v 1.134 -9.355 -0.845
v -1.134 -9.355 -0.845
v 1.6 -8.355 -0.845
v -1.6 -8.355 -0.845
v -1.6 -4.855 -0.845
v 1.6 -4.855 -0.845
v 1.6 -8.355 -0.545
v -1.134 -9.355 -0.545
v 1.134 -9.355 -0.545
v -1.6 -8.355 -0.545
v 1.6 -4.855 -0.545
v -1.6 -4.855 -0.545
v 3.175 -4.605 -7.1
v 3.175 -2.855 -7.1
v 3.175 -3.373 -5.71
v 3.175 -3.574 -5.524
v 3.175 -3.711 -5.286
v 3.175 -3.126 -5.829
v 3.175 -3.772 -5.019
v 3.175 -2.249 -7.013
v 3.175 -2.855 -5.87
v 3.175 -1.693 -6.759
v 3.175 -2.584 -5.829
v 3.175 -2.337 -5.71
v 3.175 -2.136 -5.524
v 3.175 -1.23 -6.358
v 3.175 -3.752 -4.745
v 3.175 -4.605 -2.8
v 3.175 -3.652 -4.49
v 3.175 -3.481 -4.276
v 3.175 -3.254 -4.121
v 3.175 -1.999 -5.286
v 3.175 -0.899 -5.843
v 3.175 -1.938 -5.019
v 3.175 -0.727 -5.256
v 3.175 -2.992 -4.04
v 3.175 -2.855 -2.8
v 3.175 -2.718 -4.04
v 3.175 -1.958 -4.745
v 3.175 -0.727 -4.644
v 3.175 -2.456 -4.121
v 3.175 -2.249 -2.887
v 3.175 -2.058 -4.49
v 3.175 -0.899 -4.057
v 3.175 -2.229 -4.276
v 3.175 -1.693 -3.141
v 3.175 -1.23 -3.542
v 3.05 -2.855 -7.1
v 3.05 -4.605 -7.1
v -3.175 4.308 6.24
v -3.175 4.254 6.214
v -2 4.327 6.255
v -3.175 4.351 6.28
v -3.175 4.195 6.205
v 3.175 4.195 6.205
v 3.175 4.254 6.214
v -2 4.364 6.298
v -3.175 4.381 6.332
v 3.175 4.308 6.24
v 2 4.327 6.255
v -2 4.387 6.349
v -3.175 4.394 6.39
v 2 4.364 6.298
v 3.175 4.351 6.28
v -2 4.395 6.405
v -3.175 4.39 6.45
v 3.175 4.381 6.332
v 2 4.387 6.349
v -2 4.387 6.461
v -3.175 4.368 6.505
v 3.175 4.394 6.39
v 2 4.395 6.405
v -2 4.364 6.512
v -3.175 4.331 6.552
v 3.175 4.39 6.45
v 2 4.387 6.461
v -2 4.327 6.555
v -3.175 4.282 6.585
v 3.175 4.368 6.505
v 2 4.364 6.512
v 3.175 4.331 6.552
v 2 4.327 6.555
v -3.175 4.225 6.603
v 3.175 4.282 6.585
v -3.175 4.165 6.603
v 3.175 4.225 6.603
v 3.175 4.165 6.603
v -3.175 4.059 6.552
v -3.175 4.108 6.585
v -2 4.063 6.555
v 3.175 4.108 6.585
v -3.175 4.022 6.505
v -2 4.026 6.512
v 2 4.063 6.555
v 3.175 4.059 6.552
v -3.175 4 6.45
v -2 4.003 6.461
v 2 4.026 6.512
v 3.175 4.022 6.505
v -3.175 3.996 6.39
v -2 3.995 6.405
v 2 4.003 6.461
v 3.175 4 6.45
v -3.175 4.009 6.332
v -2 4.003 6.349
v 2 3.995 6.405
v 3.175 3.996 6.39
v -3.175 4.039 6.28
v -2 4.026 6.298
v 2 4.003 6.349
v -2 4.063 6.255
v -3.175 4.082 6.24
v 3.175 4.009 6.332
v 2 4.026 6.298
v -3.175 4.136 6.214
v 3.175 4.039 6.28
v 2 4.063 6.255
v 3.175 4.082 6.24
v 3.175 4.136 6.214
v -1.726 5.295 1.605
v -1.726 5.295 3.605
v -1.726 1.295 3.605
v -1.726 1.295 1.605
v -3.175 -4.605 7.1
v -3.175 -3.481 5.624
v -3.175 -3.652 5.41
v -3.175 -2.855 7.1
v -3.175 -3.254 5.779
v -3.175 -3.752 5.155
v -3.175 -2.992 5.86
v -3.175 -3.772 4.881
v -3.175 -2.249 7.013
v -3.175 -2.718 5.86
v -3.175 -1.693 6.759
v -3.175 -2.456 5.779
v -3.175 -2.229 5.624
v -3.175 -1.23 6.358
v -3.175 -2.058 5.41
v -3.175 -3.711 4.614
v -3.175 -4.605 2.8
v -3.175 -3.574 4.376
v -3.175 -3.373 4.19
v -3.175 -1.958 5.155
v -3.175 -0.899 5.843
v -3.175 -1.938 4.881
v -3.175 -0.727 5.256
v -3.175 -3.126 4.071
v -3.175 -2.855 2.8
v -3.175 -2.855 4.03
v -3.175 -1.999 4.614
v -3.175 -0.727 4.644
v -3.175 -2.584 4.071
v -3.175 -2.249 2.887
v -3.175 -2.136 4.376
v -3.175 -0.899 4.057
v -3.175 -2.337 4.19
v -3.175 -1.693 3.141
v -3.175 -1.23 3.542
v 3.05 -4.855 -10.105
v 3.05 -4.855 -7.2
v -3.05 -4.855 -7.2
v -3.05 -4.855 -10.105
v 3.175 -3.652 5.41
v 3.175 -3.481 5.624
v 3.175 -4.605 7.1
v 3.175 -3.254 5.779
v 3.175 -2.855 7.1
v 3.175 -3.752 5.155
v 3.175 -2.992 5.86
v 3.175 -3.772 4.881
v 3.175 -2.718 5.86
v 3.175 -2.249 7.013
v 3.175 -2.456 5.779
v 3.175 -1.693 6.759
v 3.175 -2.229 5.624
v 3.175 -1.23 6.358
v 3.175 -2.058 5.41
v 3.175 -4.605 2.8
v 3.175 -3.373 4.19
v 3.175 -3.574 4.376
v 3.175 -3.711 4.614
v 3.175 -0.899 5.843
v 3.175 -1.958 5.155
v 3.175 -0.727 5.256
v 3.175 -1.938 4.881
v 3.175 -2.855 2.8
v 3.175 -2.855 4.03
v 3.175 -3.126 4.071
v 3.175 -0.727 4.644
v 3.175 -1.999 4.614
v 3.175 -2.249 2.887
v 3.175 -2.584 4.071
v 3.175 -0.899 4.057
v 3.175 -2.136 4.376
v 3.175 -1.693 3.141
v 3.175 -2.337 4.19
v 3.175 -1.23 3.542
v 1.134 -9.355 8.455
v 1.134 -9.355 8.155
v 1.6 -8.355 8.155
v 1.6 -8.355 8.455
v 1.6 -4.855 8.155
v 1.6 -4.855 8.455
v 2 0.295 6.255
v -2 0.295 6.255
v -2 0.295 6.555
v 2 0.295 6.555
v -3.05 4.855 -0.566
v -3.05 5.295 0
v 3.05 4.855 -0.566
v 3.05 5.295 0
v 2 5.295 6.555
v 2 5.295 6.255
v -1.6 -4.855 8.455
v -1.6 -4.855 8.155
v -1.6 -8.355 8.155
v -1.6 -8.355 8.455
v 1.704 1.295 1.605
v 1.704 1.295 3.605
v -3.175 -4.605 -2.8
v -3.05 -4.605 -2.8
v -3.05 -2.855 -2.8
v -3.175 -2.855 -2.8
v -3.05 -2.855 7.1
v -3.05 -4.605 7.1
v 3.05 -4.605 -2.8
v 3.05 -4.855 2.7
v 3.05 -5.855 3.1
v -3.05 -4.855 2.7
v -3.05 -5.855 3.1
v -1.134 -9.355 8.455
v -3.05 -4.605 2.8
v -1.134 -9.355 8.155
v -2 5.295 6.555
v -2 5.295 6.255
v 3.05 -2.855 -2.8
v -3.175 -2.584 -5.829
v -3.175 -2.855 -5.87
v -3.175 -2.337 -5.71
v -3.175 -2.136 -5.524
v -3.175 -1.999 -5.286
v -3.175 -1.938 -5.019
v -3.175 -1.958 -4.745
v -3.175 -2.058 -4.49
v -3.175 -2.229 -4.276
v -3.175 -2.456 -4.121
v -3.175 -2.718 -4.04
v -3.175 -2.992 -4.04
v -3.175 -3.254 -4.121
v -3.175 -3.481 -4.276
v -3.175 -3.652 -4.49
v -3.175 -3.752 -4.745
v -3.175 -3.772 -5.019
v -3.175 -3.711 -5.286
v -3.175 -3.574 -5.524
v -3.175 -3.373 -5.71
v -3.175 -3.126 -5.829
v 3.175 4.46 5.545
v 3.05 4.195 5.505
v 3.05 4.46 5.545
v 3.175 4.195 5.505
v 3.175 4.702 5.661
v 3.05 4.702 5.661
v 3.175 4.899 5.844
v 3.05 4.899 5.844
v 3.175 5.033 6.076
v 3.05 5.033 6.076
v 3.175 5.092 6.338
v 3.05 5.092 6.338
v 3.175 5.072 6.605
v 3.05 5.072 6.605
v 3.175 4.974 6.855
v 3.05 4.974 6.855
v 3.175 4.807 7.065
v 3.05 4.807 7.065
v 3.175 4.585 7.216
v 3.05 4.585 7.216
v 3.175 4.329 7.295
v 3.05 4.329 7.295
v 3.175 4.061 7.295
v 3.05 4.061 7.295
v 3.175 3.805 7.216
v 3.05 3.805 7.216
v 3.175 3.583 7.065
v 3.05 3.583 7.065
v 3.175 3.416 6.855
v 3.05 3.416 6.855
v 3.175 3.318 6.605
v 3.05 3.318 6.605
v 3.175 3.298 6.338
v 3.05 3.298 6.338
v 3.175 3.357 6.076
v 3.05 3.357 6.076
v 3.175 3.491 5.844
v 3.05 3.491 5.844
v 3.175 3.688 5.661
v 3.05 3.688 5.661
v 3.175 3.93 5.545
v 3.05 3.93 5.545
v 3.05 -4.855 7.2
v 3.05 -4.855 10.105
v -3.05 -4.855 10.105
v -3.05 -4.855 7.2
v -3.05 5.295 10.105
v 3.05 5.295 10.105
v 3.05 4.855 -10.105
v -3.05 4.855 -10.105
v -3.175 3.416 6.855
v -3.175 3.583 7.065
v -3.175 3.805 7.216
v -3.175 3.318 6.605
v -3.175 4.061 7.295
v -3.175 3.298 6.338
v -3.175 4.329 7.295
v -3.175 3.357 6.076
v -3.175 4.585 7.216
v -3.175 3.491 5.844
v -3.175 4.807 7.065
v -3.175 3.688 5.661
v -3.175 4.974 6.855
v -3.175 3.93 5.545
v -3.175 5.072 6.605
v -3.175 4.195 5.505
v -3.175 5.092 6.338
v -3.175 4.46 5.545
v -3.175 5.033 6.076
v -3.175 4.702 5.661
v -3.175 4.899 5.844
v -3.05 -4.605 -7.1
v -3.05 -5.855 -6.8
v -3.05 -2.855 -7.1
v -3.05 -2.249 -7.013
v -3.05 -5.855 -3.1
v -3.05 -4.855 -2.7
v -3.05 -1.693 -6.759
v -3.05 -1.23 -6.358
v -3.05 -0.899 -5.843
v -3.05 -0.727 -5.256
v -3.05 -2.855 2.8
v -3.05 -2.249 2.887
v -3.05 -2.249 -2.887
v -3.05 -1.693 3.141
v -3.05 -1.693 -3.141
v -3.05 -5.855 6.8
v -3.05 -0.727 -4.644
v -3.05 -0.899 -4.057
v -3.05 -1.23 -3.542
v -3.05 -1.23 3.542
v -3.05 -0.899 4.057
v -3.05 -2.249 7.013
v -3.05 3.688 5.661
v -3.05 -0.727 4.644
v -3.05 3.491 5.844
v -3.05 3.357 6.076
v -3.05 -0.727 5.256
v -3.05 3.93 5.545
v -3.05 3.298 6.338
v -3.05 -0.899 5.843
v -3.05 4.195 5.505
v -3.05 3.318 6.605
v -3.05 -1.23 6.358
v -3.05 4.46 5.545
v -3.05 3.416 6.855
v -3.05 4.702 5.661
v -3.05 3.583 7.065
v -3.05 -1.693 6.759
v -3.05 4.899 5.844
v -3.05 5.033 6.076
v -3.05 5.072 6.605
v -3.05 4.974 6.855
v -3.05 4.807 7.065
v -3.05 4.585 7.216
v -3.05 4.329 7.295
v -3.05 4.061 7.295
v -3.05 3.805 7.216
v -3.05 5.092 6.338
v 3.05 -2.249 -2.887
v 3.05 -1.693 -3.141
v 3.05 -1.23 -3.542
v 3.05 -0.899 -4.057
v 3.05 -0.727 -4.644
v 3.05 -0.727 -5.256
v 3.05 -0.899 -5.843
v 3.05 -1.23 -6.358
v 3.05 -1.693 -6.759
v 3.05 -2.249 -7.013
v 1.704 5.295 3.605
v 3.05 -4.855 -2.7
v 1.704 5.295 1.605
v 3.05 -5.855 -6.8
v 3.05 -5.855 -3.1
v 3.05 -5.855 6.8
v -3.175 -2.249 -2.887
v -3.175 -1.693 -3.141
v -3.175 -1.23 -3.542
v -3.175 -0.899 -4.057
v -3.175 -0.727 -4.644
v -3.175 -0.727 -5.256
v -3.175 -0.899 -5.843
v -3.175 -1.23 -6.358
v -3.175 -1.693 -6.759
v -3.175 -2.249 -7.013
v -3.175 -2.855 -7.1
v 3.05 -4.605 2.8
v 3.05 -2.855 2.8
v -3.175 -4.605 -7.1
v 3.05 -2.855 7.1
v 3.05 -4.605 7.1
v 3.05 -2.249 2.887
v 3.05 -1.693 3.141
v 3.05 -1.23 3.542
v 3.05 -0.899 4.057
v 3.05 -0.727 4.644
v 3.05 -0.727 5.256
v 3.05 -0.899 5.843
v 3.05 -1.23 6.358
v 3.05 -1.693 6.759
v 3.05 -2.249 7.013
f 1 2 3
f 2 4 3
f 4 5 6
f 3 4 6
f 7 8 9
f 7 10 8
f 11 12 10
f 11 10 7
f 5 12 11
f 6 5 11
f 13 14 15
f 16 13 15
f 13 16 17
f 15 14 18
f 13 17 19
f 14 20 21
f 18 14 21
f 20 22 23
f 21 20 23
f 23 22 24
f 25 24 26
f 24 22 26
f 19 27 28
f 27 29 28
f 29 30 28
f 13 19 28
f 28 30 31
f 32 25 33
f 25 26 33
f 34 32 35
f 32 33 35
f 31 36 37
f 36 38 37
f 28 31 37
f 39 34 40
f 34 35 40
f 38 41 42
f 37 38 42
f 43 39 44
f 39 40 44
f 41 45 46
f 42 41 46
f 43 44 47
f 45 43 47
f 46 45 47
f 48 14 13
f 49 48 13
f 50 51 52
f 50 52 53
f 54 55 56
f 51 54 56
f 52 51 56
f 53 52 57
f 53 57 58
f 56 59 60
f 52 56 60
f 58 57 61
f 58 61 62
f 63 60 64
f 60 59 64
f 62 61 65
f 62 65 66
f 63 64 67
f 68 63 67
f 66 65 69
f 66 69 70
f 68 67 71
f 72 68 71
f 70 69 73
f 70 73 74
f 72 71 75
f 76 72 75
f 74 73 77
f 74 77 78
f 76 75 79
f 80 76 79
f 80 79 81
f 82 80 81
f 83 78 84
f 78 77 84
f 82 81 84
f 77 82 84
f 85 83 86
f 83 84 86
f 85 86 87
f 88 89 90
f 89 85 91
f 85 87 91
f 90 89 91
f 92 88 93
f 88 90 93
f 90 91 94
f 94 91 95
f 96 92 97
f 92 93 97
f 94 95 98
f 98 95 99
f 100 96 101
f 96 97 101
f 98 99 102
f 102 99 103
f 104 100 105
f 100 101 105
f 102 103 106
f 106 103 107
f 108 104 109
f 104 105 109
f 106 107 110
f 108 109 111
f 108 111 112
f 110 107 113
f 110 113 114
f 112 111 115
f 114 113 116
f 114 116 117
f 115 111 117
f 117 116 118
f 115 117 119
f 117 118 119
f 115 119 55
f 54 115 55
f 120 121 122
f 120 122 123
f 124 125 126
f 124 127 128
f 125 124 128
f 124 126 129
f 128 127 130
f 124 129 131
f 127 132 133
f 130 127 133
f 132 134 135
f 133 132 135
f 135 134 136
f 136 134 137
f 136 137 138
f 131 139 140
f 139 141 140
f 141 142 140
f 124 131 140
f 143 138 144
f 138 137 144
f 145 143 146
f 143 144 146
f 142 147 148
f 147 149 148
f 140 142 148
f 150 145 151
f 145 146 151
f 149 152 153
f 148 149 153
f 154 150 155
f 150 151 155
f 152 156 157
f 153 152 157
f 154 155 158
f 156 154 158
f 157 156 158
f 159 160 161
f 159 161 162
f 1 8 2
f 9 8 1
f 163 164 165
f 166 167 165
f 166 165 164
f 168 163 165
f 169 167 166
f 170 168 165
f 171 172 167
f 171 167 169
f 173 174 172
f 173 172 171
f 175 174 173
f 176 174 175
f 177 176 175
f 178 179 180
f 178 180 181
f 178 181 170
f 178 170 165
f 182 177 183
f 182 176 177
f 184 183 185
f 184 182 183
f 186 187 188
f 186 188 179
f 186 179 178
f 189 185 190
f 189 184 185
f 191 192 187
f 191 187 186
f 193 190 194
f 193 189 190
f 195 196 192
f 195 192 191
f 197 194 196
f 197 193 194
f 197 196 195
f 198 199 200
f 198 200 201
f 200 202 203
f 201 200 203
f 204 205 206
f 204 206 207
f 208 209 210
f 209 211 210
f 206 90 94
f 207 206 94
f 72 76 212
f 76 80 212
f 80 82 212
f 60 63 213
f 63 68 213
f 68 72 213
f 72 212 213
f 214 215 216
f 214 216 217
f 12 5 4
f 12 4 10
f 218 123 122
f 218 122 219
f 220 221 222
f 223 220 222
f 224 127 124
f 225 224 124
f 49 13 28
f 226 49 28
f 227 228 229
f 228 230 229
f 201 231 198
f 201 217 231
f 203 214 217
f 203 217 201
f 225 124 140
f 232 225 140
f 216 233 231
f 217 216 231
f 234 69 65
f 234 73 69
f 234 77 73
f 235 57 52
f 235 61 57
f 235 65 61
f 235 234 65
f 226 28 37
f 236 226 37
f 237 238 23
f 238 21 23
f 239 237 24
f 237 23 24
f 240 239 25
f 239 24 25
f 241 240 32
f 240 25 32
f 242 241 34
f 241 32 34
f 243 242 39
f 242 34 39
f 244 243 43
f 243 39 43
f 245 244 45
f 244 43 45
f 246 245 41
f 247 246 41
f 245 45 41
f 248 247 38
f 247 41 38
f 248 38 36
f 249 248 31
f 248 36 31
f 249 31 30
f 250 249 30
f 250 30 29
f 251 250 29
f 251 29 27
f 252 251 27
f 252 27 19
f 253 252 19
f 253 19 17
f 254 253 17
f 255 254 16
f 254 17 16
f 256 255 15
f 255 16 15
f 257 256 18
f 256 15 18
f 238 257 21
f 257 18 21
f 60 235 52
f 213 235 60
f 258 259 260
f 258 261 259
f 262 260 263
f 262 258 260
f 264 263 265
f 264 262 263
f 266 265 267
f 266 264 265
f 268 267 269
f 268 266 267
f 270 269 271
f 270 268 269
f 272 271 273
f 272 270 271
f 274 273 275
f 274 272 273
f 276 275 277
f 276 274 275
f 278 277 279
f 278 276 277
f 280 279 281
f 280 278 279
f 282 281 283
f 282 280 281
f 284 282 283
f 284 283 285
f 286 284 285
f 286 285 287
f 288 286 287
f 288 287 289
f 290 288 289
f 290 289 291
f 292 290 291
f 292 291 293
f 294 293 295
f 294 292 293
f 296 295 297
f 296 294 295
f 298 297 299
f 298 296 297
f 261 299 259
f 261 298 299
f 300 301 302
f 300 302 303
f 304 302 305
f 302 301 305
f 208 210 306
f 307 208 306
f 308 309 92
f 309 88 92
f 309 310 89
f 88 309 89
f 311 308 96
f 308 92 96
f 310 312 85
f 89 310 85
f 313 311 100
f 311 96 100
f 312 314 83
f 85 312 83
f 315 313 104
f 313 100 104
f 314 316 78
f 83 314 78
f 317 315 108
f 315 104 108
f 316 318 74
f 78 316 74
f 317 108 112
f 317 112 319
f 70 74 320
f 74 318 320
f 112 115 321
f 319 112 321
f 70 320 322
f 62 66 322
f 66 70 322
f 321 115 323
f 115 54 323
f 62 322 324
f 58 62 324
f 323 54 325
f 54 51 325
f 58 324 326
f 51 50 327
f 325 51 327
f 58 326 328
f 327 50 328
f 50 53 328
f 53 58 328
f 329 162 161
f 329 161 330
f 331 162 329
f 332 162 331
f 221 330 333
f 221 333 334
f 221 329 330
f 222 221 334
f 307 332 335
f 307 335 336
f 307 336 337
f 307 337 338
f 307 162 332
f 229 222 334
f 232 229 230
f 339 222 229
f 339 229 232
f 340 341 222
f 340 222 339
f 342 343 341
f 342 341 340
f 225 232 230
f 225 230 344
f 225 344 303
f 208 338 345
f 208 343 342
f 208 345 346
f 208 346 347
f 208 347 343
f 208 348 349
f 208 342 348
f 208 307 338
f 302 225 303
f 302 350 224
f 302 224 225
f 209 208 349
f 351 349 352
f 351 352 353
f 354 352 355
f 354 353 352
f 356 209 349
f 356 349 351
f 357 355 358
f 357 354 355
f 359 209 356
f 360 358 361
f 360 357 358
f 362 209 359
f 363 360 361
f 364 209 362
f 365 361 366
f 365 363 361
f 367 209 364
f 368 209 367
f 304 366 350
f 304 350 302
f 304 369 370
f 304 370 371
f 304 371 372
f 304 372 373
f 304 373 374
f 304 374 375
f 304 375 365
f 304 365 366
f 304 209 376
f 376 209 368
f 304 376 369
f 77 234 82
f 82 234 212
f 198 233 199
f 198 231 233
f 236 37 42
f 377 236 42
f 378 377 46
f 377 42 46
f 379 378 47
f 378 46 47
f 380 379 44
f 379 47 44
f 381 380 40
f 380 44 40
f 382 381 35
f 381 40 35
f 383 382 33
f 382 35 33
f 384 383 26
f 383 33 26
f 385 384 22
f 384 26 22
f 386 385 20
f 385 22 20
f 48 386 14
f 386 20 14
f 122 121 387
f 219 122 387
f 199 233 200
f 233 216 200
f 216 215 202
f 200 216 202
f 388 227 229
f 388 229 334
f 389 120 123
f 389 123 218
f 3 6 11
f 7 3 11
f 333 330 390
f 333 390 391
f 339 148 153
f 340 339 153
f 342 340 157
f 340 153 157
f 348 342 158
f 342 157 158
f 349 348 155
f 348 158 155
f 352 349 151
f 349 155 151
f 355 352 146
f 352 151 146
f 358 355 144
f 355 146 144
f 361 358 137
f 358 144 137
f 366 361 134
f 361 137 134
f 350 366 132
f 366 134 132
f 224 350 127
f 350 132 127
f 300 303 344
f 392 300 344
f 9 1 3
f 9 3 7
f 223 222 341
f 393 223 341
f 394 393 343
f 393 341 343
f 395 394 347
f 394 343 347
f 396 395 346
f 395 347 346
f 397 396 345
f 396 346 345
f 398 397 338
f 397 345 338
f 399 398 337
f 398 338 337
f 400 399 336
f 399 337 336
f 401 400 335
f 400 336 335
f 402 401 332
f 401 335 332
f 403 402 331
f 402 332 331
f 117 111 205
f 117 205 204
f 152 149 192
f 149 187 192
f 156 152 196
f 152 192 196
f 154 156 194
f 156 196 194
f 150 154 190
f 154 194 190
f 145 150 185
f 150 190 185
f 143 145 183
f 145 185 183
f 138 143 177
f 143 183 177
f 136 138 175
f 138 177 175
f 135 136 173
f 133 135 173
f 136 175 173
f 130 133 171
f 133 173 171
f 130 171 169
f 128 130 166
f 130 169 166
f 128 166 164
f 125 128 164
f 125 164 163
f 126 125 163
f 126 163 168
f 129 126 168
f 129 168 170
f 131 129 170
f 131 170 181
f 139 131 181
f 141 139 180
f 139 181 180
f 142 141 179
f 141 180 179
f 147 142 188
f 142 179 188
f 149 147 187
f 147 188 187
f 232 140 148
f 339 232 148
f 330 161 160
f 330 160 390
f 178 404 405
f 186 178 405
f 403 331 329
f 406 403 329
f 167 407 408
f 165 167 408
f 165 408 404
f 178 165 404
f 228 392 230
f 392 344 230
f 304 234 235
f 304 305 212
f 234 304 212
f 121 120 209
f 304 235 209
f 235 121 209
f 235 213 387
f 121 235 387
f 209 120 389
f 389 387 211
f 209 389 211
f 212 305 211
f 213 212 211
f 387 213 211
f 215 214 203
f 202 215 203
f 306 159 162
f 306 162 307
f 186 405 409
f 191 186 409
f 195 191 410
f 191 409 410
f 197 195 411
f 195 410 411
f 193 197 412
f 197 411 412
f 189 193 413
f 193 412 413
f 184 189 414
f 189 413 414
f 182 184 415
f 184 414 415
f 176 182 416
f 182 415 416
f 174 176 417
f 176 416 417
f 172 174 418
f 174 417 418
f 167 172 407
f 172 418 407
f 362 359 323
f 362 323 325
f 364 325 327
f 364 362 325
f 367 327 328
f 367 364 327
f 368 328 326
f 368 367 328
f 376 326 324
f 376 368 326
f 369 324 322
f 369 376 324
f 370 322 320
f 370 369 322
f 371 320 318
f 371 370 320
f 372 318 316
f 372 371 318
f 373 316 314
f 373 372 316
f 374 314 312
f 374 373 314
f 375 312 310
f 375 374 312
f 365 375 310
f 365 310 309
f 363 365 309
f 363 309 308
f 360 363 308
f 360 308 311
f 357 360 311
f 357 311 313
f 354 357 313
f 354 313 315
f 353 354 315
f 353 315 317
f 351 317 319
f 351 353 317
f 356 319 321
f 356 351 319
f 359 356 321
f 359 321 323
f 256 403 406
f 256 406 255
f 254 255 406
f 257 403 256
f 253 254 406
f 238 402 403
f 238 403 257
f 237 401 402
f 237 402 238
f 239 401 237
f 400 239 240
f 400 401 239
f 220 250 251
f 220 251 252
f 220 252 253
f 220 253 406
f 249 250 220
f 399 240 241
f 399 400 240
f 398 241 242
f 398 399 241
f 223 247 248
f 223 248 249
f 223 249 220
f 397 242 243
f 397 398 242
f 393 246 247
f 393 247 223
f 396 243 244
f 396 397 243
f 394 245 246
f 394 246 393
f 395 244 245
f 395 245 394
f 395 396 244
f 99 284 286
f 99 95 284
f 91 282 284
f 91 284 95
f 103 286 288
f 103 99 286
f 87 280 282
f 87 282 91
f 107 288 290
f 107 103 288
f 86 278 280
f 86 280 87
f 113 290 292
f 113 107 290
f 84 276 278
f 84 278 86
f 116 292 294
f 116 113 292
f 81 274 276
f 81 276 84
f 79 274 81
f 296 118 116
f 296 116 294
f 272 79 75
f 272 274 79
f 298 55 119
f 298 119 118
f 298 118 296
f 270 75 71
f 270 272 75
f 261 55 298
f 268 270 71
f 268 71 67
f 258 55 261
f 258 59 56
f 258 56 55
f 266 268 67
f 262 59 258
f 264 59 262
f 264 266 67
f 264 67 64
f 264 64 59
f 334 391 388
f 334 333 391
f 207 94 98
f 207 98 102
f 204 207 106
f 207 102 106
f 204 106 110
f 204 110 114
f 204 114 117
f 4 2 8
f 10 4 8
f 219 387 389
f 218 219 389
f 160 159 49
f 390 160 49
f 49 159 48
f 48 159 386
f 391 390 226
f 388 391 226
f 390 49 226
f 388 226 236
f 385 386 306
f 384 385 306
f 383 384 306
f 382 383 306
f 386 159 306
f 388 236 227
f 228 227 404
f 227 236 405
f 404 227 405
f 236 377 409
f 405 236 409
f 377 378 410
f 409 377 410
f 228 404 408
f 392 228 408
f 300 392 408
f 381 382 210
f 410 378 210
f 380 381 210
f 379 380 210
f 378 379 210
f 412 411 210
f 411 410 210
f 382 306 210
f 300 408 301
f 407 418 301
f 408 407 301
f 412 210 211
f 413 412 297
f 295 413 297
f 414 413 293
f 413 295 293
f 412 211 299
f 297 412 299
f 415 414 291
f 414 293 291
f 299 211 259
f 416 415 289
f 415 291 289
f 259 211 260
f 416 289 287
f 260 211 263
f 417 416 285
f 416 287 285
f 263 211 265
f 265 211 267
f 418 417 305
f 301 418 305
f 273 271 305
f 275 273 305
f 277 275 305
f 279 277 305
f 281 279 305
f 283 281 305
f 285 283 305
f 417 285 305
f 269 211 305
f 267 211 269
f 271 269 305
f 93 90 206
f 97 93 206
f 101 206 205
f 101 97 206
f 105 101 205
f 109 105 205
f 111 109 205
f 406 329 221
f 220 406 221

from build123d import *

# Parameters (mm, degrees)
SKETCH1_W               = 20.21
SKETCH1_H               = 9.71
BOSS_EXTRUDE1_DEPTH     = 3.05
BOSS_EXTRUDE2_DEPTH     = 3.05
BOSS_EXTRUDE3_DEPTH     = 3.175
MOUNTING_HOLES_R        = 0.92
CUT_EXTRUDE1_DEPTH      = 4.175
CUT_EXTRUDE1_DEPTH_BACK = 4.175
SKETCH5_R               = 0.9
BOSS_EXTRUDE4_DEPTH     = 3.175
SKETCH6_R               = 0.2
CUT_EXTRUDE2_DEPTH      = 4.175
CUT_EXTRUDE2_DEPTH_BACK = 4.175
SKETCH7_W               = 4
SKETCH7_H               = 0.3
CUT_EXTRUDE3_DEPTH      = 5
SKETCH8_W               = 3.43
SKETCH8_H               = 2
CUT_EXTRUDE4_DEPTH      = 4
SKETCH9_W               = 3.2
SKETCH9_H               = 0.3
BOSS_EXTRUDE5_DEPTH     = 4.5
BOSS_EXTRUDE5_2_DEPTH   = 4.5
CHAMFER1_SIZE           = 1
CHAMFER1_SIZE2          = 0.466307658
CHAMFER1_PART_2_SIZE    = 1
CHAMFER1_PART_2_SIZE2   = 0.466307658
CHAMFER2_SIZE           = 1
CHAMFER2_SIZE2          = 0.466307658
CHAMFER2_PART_2_SIZE    = 1
CHAMFER2_PART_2_SIZE2   = 0.466307658


with BuildPart() as part:
    # Sketch1 → Boss-Extrude1 (new body, symmetric)
    with BuildSketch(Plane(origin=(0, 0, 0), x_dir=(0, 0, -1), z_dir=(1, 0, 0))):
        Rectangle(SKETCH1_W, SKETCH1_H)
    extrude(amount=BOSS_EXTRUDE1_DEPTH, both=True)

    # Sketch4 → Boss-Extrude2 (add, symmetric)
    with BuildSketch(Plane(origin=(0, 0, 0), x_dir=(0, 0, -1), z_dir=(1, 0, 0))):
        Polygon((-7.2, -4.855), (-6.8, -5.855), (-3.1, -5.855), (-2.7, -4.855), align=None)
        Polygon((2.7, -4.855), (7.2, -4.855), (6.8, -5.855), (3.1, -5.855), align=None)
        Polygon((-10.105, 4.855), (-10.105, 5.295), (0, 5.295), (0.566278635, 4.855), align=None)
    extrude(amount=BOSS_EXTRUDE2_DEPTH, both=True)

    # Sketch3 → Boss-Extrude3 (add, symmetric)
    with BuildSketch(Plane(origin=(0, 0, 0), x_dir=(0, 0, -1), z_dir=(1, 0, 0))):
        with BuildLine():
            Line((-7.1, -2.855), (-7.1, -4.605))
            Line((-7.1, -4.605), (-2.8, -4.605))
            Line((-2.8, -4.605), (-2.8, -2.855))
            ThreePointArc((-2.8, -2.855), (-4.95, -0.705), (-7.1, -2.855))
        make_face()
        with BuildLine():
            Line((2.8, -4.605), (2.8, -2.855))
            ThreePointArc((2.8, -2.855), (4.95, -0.705), (7.1, -2.855))
            Line((7.1, -2.855), (7.1, -4.605))
            Line((7.1, -4.605), (2.8, -4.605))
        make_face()
    extrude(amount=BOSS_EXTRUDE3_DEPTH, both=True)

    # Mounting Holes → Cut-Extrude1 (cut, two sides)
    with BuildSketch(Plane(origin=(0, 0, 0), x_dir=(0, 0, -1), z_dir=(1, 0, 0))) as cut_extrude1_sk:
        with Locations((-4.95, -2.855)):
            Circle(MOUNTING_HOLES_R)
        with Locations((4.95, -2.855)):
            Circle(MOUNTING_HOLES_R)
    extrude(amount=CUT_EXTRUDE1_DEPTH, mode=Mode.SUBTRACT)
    extrude(cut_extrude1_sk.sketch, amount=-CUT_EXTRUDE1_DEPTH_BACK, mode=Mode.SUBTRACT)

    # Sketch5 → Boss-Extrude4 (add, symmetric)
    with BuildSketch(Plane(origin=(0, 0, 0), x_dir=(0, 0, -1), z_dir=(1, 0, 0))):
        with Locations((-6.405, 4.195)):
            Circle(SKETCH5_R)
    extrude(amount=BOSS_EXTRUDE4_DEPTH, both=True)

    # Sketch6 → Cut-Extrude2 (cut, two sides)
    with BuildSketch(Plane(origin=(0, 0, 0), x_dir=(0, 0, -1), z_dir=(1, 0, 0))) as cut_extrude2_sk:
        with Locations((-6.405, 4.195)):
            Circle(SKETCH6_R)
    extrude(amount=CUT_EXTRUDE2_DEPTH, mode=Mode.SUBTRACT)
    extrude(cut_extrude2_sk.sketch, amount=-CUT_EXTRUDE2_DEPTH_BACK, mode=Mode.SUBTRACT)

    # Sketch7 → Cut-Extrude3 (cut)
    with BuildSketch(Plane(origin=(0, 5.295, 0), x_dir=(1, 0, 0), z_dir=(0, 1, 0))):
        with Locations((0, -6.405)):
            Rectangle(SKETCH7_W, SKETCH7_H)
    extrude(amount=-CUT_EXTRUDE3_DEPTH, mode=Mode.SUBTRACT)

    # Sketch8 → Cut-Extrude4 (cut)
    with BuildSketch(Plane(origin=(0, 5.295, 0), x_dir=(1, 0, 0), z_dir=(0, 1, 0))):
        with Locations((-0.01148339, -2.605)):
            Rectangle(SKETCH8_W, SKETCH8_H)
    extrude(amount=-CUT_EXTRUDE4_DEPTH, mode=Mode.SUBTRACT)


with BuildPart() as body_2:
    # Sketch9 → Boss-Extrude5 (new body)
    with BuildSketch(Plane.XZ.offset(4.855)):
        with Locations((0, 8.305)):
            Rectangle(SKETCH9_W, SKETCH9_H)
    extrude(amount=BOSS_EXTRUDE5_DEPTH)

    # Chamfer2
    chamfer2_edges = [body_2.edges().sort_by_distance(p)[0] for p in [
        (1.6, -9.355, 8.305),
    ]]
    chamfer2_side = [body_2.faces().sort_by_distance(p)[0] for p in [
        (1.6, -7.105, 8.305),
    ]]
    chamfer(chamfer2_edges, length=CHAMFER2_SIZE, length2=CHAMFER2_SIZE2, reference=chamfer2_side[0])

    # Chamfer2 part 2
    chamfer2_part_2_edges = [body_2.edges().sort_by_distance(p)[0] for p in [
        (-1.6, -9.355, 8.305),
    ]]
    chamfer2_part_2_side = [body_2.faces().sort_by_distance(p)[0] for p in [
        (-1.6, -7.105, 8.305),
    ]]
    chamfer(chamfer2_part_2_edges, length=CHAMFER2_PART_2_SIZE, length2=CHAMFER2_PART_2_SIZE2, reference=chamfer2_part_2_side[0])


with BuildPart() as body_3:
    # Sketch9 → Boss-Extrude5 2 (new body)
    with BuildSketch(Plane.XZ.offset(4.855)):
        with Locations((0, -0.695)):
            Rectangle(SKETCH9_W, SKETCH9_H)
    extrude(amount=BOSS_EXTRUDE5_2_DEPTH)

    # Chamfer1
    chamfer1_edges = [body_3.edges().sort_by_distance(p)[0] for p in [
        (1.6, -9.355, -0.695),
    ]]
    chamfer1_side = [body_3.faces().sort_by_distance(p)[0] for p in [
        (1.6, -7.105, -0.695),
    ]]
    chamfer(chamfer1_edges, length=CHAMFER1_SIZE, length2=CHAMFER1_SIZE2, reference=chamfer1_side[0])

    # Chamfer1 part 2
    chamfer1_part_2_edges = [body_3.edges().sort_by_distance(p)[0] for p in [
        (-1.6, -9.355, -0.695),
    ]]
    chamfer1_part_2_side = [body_3.faces().sort_by_distance(p)[0] for p in [
        (-1.6, -7.105, -0.695),
    ]]
    chamfer(chamfer1_part_2_edges, length=CHAMFER1_PART_2_SIZE, length2=CHAMFER1_PART_2_SIZE2, reference=chamfer1_part_2_side[0])


solid = Compound([part.part, body_2.part, body_3.part])
